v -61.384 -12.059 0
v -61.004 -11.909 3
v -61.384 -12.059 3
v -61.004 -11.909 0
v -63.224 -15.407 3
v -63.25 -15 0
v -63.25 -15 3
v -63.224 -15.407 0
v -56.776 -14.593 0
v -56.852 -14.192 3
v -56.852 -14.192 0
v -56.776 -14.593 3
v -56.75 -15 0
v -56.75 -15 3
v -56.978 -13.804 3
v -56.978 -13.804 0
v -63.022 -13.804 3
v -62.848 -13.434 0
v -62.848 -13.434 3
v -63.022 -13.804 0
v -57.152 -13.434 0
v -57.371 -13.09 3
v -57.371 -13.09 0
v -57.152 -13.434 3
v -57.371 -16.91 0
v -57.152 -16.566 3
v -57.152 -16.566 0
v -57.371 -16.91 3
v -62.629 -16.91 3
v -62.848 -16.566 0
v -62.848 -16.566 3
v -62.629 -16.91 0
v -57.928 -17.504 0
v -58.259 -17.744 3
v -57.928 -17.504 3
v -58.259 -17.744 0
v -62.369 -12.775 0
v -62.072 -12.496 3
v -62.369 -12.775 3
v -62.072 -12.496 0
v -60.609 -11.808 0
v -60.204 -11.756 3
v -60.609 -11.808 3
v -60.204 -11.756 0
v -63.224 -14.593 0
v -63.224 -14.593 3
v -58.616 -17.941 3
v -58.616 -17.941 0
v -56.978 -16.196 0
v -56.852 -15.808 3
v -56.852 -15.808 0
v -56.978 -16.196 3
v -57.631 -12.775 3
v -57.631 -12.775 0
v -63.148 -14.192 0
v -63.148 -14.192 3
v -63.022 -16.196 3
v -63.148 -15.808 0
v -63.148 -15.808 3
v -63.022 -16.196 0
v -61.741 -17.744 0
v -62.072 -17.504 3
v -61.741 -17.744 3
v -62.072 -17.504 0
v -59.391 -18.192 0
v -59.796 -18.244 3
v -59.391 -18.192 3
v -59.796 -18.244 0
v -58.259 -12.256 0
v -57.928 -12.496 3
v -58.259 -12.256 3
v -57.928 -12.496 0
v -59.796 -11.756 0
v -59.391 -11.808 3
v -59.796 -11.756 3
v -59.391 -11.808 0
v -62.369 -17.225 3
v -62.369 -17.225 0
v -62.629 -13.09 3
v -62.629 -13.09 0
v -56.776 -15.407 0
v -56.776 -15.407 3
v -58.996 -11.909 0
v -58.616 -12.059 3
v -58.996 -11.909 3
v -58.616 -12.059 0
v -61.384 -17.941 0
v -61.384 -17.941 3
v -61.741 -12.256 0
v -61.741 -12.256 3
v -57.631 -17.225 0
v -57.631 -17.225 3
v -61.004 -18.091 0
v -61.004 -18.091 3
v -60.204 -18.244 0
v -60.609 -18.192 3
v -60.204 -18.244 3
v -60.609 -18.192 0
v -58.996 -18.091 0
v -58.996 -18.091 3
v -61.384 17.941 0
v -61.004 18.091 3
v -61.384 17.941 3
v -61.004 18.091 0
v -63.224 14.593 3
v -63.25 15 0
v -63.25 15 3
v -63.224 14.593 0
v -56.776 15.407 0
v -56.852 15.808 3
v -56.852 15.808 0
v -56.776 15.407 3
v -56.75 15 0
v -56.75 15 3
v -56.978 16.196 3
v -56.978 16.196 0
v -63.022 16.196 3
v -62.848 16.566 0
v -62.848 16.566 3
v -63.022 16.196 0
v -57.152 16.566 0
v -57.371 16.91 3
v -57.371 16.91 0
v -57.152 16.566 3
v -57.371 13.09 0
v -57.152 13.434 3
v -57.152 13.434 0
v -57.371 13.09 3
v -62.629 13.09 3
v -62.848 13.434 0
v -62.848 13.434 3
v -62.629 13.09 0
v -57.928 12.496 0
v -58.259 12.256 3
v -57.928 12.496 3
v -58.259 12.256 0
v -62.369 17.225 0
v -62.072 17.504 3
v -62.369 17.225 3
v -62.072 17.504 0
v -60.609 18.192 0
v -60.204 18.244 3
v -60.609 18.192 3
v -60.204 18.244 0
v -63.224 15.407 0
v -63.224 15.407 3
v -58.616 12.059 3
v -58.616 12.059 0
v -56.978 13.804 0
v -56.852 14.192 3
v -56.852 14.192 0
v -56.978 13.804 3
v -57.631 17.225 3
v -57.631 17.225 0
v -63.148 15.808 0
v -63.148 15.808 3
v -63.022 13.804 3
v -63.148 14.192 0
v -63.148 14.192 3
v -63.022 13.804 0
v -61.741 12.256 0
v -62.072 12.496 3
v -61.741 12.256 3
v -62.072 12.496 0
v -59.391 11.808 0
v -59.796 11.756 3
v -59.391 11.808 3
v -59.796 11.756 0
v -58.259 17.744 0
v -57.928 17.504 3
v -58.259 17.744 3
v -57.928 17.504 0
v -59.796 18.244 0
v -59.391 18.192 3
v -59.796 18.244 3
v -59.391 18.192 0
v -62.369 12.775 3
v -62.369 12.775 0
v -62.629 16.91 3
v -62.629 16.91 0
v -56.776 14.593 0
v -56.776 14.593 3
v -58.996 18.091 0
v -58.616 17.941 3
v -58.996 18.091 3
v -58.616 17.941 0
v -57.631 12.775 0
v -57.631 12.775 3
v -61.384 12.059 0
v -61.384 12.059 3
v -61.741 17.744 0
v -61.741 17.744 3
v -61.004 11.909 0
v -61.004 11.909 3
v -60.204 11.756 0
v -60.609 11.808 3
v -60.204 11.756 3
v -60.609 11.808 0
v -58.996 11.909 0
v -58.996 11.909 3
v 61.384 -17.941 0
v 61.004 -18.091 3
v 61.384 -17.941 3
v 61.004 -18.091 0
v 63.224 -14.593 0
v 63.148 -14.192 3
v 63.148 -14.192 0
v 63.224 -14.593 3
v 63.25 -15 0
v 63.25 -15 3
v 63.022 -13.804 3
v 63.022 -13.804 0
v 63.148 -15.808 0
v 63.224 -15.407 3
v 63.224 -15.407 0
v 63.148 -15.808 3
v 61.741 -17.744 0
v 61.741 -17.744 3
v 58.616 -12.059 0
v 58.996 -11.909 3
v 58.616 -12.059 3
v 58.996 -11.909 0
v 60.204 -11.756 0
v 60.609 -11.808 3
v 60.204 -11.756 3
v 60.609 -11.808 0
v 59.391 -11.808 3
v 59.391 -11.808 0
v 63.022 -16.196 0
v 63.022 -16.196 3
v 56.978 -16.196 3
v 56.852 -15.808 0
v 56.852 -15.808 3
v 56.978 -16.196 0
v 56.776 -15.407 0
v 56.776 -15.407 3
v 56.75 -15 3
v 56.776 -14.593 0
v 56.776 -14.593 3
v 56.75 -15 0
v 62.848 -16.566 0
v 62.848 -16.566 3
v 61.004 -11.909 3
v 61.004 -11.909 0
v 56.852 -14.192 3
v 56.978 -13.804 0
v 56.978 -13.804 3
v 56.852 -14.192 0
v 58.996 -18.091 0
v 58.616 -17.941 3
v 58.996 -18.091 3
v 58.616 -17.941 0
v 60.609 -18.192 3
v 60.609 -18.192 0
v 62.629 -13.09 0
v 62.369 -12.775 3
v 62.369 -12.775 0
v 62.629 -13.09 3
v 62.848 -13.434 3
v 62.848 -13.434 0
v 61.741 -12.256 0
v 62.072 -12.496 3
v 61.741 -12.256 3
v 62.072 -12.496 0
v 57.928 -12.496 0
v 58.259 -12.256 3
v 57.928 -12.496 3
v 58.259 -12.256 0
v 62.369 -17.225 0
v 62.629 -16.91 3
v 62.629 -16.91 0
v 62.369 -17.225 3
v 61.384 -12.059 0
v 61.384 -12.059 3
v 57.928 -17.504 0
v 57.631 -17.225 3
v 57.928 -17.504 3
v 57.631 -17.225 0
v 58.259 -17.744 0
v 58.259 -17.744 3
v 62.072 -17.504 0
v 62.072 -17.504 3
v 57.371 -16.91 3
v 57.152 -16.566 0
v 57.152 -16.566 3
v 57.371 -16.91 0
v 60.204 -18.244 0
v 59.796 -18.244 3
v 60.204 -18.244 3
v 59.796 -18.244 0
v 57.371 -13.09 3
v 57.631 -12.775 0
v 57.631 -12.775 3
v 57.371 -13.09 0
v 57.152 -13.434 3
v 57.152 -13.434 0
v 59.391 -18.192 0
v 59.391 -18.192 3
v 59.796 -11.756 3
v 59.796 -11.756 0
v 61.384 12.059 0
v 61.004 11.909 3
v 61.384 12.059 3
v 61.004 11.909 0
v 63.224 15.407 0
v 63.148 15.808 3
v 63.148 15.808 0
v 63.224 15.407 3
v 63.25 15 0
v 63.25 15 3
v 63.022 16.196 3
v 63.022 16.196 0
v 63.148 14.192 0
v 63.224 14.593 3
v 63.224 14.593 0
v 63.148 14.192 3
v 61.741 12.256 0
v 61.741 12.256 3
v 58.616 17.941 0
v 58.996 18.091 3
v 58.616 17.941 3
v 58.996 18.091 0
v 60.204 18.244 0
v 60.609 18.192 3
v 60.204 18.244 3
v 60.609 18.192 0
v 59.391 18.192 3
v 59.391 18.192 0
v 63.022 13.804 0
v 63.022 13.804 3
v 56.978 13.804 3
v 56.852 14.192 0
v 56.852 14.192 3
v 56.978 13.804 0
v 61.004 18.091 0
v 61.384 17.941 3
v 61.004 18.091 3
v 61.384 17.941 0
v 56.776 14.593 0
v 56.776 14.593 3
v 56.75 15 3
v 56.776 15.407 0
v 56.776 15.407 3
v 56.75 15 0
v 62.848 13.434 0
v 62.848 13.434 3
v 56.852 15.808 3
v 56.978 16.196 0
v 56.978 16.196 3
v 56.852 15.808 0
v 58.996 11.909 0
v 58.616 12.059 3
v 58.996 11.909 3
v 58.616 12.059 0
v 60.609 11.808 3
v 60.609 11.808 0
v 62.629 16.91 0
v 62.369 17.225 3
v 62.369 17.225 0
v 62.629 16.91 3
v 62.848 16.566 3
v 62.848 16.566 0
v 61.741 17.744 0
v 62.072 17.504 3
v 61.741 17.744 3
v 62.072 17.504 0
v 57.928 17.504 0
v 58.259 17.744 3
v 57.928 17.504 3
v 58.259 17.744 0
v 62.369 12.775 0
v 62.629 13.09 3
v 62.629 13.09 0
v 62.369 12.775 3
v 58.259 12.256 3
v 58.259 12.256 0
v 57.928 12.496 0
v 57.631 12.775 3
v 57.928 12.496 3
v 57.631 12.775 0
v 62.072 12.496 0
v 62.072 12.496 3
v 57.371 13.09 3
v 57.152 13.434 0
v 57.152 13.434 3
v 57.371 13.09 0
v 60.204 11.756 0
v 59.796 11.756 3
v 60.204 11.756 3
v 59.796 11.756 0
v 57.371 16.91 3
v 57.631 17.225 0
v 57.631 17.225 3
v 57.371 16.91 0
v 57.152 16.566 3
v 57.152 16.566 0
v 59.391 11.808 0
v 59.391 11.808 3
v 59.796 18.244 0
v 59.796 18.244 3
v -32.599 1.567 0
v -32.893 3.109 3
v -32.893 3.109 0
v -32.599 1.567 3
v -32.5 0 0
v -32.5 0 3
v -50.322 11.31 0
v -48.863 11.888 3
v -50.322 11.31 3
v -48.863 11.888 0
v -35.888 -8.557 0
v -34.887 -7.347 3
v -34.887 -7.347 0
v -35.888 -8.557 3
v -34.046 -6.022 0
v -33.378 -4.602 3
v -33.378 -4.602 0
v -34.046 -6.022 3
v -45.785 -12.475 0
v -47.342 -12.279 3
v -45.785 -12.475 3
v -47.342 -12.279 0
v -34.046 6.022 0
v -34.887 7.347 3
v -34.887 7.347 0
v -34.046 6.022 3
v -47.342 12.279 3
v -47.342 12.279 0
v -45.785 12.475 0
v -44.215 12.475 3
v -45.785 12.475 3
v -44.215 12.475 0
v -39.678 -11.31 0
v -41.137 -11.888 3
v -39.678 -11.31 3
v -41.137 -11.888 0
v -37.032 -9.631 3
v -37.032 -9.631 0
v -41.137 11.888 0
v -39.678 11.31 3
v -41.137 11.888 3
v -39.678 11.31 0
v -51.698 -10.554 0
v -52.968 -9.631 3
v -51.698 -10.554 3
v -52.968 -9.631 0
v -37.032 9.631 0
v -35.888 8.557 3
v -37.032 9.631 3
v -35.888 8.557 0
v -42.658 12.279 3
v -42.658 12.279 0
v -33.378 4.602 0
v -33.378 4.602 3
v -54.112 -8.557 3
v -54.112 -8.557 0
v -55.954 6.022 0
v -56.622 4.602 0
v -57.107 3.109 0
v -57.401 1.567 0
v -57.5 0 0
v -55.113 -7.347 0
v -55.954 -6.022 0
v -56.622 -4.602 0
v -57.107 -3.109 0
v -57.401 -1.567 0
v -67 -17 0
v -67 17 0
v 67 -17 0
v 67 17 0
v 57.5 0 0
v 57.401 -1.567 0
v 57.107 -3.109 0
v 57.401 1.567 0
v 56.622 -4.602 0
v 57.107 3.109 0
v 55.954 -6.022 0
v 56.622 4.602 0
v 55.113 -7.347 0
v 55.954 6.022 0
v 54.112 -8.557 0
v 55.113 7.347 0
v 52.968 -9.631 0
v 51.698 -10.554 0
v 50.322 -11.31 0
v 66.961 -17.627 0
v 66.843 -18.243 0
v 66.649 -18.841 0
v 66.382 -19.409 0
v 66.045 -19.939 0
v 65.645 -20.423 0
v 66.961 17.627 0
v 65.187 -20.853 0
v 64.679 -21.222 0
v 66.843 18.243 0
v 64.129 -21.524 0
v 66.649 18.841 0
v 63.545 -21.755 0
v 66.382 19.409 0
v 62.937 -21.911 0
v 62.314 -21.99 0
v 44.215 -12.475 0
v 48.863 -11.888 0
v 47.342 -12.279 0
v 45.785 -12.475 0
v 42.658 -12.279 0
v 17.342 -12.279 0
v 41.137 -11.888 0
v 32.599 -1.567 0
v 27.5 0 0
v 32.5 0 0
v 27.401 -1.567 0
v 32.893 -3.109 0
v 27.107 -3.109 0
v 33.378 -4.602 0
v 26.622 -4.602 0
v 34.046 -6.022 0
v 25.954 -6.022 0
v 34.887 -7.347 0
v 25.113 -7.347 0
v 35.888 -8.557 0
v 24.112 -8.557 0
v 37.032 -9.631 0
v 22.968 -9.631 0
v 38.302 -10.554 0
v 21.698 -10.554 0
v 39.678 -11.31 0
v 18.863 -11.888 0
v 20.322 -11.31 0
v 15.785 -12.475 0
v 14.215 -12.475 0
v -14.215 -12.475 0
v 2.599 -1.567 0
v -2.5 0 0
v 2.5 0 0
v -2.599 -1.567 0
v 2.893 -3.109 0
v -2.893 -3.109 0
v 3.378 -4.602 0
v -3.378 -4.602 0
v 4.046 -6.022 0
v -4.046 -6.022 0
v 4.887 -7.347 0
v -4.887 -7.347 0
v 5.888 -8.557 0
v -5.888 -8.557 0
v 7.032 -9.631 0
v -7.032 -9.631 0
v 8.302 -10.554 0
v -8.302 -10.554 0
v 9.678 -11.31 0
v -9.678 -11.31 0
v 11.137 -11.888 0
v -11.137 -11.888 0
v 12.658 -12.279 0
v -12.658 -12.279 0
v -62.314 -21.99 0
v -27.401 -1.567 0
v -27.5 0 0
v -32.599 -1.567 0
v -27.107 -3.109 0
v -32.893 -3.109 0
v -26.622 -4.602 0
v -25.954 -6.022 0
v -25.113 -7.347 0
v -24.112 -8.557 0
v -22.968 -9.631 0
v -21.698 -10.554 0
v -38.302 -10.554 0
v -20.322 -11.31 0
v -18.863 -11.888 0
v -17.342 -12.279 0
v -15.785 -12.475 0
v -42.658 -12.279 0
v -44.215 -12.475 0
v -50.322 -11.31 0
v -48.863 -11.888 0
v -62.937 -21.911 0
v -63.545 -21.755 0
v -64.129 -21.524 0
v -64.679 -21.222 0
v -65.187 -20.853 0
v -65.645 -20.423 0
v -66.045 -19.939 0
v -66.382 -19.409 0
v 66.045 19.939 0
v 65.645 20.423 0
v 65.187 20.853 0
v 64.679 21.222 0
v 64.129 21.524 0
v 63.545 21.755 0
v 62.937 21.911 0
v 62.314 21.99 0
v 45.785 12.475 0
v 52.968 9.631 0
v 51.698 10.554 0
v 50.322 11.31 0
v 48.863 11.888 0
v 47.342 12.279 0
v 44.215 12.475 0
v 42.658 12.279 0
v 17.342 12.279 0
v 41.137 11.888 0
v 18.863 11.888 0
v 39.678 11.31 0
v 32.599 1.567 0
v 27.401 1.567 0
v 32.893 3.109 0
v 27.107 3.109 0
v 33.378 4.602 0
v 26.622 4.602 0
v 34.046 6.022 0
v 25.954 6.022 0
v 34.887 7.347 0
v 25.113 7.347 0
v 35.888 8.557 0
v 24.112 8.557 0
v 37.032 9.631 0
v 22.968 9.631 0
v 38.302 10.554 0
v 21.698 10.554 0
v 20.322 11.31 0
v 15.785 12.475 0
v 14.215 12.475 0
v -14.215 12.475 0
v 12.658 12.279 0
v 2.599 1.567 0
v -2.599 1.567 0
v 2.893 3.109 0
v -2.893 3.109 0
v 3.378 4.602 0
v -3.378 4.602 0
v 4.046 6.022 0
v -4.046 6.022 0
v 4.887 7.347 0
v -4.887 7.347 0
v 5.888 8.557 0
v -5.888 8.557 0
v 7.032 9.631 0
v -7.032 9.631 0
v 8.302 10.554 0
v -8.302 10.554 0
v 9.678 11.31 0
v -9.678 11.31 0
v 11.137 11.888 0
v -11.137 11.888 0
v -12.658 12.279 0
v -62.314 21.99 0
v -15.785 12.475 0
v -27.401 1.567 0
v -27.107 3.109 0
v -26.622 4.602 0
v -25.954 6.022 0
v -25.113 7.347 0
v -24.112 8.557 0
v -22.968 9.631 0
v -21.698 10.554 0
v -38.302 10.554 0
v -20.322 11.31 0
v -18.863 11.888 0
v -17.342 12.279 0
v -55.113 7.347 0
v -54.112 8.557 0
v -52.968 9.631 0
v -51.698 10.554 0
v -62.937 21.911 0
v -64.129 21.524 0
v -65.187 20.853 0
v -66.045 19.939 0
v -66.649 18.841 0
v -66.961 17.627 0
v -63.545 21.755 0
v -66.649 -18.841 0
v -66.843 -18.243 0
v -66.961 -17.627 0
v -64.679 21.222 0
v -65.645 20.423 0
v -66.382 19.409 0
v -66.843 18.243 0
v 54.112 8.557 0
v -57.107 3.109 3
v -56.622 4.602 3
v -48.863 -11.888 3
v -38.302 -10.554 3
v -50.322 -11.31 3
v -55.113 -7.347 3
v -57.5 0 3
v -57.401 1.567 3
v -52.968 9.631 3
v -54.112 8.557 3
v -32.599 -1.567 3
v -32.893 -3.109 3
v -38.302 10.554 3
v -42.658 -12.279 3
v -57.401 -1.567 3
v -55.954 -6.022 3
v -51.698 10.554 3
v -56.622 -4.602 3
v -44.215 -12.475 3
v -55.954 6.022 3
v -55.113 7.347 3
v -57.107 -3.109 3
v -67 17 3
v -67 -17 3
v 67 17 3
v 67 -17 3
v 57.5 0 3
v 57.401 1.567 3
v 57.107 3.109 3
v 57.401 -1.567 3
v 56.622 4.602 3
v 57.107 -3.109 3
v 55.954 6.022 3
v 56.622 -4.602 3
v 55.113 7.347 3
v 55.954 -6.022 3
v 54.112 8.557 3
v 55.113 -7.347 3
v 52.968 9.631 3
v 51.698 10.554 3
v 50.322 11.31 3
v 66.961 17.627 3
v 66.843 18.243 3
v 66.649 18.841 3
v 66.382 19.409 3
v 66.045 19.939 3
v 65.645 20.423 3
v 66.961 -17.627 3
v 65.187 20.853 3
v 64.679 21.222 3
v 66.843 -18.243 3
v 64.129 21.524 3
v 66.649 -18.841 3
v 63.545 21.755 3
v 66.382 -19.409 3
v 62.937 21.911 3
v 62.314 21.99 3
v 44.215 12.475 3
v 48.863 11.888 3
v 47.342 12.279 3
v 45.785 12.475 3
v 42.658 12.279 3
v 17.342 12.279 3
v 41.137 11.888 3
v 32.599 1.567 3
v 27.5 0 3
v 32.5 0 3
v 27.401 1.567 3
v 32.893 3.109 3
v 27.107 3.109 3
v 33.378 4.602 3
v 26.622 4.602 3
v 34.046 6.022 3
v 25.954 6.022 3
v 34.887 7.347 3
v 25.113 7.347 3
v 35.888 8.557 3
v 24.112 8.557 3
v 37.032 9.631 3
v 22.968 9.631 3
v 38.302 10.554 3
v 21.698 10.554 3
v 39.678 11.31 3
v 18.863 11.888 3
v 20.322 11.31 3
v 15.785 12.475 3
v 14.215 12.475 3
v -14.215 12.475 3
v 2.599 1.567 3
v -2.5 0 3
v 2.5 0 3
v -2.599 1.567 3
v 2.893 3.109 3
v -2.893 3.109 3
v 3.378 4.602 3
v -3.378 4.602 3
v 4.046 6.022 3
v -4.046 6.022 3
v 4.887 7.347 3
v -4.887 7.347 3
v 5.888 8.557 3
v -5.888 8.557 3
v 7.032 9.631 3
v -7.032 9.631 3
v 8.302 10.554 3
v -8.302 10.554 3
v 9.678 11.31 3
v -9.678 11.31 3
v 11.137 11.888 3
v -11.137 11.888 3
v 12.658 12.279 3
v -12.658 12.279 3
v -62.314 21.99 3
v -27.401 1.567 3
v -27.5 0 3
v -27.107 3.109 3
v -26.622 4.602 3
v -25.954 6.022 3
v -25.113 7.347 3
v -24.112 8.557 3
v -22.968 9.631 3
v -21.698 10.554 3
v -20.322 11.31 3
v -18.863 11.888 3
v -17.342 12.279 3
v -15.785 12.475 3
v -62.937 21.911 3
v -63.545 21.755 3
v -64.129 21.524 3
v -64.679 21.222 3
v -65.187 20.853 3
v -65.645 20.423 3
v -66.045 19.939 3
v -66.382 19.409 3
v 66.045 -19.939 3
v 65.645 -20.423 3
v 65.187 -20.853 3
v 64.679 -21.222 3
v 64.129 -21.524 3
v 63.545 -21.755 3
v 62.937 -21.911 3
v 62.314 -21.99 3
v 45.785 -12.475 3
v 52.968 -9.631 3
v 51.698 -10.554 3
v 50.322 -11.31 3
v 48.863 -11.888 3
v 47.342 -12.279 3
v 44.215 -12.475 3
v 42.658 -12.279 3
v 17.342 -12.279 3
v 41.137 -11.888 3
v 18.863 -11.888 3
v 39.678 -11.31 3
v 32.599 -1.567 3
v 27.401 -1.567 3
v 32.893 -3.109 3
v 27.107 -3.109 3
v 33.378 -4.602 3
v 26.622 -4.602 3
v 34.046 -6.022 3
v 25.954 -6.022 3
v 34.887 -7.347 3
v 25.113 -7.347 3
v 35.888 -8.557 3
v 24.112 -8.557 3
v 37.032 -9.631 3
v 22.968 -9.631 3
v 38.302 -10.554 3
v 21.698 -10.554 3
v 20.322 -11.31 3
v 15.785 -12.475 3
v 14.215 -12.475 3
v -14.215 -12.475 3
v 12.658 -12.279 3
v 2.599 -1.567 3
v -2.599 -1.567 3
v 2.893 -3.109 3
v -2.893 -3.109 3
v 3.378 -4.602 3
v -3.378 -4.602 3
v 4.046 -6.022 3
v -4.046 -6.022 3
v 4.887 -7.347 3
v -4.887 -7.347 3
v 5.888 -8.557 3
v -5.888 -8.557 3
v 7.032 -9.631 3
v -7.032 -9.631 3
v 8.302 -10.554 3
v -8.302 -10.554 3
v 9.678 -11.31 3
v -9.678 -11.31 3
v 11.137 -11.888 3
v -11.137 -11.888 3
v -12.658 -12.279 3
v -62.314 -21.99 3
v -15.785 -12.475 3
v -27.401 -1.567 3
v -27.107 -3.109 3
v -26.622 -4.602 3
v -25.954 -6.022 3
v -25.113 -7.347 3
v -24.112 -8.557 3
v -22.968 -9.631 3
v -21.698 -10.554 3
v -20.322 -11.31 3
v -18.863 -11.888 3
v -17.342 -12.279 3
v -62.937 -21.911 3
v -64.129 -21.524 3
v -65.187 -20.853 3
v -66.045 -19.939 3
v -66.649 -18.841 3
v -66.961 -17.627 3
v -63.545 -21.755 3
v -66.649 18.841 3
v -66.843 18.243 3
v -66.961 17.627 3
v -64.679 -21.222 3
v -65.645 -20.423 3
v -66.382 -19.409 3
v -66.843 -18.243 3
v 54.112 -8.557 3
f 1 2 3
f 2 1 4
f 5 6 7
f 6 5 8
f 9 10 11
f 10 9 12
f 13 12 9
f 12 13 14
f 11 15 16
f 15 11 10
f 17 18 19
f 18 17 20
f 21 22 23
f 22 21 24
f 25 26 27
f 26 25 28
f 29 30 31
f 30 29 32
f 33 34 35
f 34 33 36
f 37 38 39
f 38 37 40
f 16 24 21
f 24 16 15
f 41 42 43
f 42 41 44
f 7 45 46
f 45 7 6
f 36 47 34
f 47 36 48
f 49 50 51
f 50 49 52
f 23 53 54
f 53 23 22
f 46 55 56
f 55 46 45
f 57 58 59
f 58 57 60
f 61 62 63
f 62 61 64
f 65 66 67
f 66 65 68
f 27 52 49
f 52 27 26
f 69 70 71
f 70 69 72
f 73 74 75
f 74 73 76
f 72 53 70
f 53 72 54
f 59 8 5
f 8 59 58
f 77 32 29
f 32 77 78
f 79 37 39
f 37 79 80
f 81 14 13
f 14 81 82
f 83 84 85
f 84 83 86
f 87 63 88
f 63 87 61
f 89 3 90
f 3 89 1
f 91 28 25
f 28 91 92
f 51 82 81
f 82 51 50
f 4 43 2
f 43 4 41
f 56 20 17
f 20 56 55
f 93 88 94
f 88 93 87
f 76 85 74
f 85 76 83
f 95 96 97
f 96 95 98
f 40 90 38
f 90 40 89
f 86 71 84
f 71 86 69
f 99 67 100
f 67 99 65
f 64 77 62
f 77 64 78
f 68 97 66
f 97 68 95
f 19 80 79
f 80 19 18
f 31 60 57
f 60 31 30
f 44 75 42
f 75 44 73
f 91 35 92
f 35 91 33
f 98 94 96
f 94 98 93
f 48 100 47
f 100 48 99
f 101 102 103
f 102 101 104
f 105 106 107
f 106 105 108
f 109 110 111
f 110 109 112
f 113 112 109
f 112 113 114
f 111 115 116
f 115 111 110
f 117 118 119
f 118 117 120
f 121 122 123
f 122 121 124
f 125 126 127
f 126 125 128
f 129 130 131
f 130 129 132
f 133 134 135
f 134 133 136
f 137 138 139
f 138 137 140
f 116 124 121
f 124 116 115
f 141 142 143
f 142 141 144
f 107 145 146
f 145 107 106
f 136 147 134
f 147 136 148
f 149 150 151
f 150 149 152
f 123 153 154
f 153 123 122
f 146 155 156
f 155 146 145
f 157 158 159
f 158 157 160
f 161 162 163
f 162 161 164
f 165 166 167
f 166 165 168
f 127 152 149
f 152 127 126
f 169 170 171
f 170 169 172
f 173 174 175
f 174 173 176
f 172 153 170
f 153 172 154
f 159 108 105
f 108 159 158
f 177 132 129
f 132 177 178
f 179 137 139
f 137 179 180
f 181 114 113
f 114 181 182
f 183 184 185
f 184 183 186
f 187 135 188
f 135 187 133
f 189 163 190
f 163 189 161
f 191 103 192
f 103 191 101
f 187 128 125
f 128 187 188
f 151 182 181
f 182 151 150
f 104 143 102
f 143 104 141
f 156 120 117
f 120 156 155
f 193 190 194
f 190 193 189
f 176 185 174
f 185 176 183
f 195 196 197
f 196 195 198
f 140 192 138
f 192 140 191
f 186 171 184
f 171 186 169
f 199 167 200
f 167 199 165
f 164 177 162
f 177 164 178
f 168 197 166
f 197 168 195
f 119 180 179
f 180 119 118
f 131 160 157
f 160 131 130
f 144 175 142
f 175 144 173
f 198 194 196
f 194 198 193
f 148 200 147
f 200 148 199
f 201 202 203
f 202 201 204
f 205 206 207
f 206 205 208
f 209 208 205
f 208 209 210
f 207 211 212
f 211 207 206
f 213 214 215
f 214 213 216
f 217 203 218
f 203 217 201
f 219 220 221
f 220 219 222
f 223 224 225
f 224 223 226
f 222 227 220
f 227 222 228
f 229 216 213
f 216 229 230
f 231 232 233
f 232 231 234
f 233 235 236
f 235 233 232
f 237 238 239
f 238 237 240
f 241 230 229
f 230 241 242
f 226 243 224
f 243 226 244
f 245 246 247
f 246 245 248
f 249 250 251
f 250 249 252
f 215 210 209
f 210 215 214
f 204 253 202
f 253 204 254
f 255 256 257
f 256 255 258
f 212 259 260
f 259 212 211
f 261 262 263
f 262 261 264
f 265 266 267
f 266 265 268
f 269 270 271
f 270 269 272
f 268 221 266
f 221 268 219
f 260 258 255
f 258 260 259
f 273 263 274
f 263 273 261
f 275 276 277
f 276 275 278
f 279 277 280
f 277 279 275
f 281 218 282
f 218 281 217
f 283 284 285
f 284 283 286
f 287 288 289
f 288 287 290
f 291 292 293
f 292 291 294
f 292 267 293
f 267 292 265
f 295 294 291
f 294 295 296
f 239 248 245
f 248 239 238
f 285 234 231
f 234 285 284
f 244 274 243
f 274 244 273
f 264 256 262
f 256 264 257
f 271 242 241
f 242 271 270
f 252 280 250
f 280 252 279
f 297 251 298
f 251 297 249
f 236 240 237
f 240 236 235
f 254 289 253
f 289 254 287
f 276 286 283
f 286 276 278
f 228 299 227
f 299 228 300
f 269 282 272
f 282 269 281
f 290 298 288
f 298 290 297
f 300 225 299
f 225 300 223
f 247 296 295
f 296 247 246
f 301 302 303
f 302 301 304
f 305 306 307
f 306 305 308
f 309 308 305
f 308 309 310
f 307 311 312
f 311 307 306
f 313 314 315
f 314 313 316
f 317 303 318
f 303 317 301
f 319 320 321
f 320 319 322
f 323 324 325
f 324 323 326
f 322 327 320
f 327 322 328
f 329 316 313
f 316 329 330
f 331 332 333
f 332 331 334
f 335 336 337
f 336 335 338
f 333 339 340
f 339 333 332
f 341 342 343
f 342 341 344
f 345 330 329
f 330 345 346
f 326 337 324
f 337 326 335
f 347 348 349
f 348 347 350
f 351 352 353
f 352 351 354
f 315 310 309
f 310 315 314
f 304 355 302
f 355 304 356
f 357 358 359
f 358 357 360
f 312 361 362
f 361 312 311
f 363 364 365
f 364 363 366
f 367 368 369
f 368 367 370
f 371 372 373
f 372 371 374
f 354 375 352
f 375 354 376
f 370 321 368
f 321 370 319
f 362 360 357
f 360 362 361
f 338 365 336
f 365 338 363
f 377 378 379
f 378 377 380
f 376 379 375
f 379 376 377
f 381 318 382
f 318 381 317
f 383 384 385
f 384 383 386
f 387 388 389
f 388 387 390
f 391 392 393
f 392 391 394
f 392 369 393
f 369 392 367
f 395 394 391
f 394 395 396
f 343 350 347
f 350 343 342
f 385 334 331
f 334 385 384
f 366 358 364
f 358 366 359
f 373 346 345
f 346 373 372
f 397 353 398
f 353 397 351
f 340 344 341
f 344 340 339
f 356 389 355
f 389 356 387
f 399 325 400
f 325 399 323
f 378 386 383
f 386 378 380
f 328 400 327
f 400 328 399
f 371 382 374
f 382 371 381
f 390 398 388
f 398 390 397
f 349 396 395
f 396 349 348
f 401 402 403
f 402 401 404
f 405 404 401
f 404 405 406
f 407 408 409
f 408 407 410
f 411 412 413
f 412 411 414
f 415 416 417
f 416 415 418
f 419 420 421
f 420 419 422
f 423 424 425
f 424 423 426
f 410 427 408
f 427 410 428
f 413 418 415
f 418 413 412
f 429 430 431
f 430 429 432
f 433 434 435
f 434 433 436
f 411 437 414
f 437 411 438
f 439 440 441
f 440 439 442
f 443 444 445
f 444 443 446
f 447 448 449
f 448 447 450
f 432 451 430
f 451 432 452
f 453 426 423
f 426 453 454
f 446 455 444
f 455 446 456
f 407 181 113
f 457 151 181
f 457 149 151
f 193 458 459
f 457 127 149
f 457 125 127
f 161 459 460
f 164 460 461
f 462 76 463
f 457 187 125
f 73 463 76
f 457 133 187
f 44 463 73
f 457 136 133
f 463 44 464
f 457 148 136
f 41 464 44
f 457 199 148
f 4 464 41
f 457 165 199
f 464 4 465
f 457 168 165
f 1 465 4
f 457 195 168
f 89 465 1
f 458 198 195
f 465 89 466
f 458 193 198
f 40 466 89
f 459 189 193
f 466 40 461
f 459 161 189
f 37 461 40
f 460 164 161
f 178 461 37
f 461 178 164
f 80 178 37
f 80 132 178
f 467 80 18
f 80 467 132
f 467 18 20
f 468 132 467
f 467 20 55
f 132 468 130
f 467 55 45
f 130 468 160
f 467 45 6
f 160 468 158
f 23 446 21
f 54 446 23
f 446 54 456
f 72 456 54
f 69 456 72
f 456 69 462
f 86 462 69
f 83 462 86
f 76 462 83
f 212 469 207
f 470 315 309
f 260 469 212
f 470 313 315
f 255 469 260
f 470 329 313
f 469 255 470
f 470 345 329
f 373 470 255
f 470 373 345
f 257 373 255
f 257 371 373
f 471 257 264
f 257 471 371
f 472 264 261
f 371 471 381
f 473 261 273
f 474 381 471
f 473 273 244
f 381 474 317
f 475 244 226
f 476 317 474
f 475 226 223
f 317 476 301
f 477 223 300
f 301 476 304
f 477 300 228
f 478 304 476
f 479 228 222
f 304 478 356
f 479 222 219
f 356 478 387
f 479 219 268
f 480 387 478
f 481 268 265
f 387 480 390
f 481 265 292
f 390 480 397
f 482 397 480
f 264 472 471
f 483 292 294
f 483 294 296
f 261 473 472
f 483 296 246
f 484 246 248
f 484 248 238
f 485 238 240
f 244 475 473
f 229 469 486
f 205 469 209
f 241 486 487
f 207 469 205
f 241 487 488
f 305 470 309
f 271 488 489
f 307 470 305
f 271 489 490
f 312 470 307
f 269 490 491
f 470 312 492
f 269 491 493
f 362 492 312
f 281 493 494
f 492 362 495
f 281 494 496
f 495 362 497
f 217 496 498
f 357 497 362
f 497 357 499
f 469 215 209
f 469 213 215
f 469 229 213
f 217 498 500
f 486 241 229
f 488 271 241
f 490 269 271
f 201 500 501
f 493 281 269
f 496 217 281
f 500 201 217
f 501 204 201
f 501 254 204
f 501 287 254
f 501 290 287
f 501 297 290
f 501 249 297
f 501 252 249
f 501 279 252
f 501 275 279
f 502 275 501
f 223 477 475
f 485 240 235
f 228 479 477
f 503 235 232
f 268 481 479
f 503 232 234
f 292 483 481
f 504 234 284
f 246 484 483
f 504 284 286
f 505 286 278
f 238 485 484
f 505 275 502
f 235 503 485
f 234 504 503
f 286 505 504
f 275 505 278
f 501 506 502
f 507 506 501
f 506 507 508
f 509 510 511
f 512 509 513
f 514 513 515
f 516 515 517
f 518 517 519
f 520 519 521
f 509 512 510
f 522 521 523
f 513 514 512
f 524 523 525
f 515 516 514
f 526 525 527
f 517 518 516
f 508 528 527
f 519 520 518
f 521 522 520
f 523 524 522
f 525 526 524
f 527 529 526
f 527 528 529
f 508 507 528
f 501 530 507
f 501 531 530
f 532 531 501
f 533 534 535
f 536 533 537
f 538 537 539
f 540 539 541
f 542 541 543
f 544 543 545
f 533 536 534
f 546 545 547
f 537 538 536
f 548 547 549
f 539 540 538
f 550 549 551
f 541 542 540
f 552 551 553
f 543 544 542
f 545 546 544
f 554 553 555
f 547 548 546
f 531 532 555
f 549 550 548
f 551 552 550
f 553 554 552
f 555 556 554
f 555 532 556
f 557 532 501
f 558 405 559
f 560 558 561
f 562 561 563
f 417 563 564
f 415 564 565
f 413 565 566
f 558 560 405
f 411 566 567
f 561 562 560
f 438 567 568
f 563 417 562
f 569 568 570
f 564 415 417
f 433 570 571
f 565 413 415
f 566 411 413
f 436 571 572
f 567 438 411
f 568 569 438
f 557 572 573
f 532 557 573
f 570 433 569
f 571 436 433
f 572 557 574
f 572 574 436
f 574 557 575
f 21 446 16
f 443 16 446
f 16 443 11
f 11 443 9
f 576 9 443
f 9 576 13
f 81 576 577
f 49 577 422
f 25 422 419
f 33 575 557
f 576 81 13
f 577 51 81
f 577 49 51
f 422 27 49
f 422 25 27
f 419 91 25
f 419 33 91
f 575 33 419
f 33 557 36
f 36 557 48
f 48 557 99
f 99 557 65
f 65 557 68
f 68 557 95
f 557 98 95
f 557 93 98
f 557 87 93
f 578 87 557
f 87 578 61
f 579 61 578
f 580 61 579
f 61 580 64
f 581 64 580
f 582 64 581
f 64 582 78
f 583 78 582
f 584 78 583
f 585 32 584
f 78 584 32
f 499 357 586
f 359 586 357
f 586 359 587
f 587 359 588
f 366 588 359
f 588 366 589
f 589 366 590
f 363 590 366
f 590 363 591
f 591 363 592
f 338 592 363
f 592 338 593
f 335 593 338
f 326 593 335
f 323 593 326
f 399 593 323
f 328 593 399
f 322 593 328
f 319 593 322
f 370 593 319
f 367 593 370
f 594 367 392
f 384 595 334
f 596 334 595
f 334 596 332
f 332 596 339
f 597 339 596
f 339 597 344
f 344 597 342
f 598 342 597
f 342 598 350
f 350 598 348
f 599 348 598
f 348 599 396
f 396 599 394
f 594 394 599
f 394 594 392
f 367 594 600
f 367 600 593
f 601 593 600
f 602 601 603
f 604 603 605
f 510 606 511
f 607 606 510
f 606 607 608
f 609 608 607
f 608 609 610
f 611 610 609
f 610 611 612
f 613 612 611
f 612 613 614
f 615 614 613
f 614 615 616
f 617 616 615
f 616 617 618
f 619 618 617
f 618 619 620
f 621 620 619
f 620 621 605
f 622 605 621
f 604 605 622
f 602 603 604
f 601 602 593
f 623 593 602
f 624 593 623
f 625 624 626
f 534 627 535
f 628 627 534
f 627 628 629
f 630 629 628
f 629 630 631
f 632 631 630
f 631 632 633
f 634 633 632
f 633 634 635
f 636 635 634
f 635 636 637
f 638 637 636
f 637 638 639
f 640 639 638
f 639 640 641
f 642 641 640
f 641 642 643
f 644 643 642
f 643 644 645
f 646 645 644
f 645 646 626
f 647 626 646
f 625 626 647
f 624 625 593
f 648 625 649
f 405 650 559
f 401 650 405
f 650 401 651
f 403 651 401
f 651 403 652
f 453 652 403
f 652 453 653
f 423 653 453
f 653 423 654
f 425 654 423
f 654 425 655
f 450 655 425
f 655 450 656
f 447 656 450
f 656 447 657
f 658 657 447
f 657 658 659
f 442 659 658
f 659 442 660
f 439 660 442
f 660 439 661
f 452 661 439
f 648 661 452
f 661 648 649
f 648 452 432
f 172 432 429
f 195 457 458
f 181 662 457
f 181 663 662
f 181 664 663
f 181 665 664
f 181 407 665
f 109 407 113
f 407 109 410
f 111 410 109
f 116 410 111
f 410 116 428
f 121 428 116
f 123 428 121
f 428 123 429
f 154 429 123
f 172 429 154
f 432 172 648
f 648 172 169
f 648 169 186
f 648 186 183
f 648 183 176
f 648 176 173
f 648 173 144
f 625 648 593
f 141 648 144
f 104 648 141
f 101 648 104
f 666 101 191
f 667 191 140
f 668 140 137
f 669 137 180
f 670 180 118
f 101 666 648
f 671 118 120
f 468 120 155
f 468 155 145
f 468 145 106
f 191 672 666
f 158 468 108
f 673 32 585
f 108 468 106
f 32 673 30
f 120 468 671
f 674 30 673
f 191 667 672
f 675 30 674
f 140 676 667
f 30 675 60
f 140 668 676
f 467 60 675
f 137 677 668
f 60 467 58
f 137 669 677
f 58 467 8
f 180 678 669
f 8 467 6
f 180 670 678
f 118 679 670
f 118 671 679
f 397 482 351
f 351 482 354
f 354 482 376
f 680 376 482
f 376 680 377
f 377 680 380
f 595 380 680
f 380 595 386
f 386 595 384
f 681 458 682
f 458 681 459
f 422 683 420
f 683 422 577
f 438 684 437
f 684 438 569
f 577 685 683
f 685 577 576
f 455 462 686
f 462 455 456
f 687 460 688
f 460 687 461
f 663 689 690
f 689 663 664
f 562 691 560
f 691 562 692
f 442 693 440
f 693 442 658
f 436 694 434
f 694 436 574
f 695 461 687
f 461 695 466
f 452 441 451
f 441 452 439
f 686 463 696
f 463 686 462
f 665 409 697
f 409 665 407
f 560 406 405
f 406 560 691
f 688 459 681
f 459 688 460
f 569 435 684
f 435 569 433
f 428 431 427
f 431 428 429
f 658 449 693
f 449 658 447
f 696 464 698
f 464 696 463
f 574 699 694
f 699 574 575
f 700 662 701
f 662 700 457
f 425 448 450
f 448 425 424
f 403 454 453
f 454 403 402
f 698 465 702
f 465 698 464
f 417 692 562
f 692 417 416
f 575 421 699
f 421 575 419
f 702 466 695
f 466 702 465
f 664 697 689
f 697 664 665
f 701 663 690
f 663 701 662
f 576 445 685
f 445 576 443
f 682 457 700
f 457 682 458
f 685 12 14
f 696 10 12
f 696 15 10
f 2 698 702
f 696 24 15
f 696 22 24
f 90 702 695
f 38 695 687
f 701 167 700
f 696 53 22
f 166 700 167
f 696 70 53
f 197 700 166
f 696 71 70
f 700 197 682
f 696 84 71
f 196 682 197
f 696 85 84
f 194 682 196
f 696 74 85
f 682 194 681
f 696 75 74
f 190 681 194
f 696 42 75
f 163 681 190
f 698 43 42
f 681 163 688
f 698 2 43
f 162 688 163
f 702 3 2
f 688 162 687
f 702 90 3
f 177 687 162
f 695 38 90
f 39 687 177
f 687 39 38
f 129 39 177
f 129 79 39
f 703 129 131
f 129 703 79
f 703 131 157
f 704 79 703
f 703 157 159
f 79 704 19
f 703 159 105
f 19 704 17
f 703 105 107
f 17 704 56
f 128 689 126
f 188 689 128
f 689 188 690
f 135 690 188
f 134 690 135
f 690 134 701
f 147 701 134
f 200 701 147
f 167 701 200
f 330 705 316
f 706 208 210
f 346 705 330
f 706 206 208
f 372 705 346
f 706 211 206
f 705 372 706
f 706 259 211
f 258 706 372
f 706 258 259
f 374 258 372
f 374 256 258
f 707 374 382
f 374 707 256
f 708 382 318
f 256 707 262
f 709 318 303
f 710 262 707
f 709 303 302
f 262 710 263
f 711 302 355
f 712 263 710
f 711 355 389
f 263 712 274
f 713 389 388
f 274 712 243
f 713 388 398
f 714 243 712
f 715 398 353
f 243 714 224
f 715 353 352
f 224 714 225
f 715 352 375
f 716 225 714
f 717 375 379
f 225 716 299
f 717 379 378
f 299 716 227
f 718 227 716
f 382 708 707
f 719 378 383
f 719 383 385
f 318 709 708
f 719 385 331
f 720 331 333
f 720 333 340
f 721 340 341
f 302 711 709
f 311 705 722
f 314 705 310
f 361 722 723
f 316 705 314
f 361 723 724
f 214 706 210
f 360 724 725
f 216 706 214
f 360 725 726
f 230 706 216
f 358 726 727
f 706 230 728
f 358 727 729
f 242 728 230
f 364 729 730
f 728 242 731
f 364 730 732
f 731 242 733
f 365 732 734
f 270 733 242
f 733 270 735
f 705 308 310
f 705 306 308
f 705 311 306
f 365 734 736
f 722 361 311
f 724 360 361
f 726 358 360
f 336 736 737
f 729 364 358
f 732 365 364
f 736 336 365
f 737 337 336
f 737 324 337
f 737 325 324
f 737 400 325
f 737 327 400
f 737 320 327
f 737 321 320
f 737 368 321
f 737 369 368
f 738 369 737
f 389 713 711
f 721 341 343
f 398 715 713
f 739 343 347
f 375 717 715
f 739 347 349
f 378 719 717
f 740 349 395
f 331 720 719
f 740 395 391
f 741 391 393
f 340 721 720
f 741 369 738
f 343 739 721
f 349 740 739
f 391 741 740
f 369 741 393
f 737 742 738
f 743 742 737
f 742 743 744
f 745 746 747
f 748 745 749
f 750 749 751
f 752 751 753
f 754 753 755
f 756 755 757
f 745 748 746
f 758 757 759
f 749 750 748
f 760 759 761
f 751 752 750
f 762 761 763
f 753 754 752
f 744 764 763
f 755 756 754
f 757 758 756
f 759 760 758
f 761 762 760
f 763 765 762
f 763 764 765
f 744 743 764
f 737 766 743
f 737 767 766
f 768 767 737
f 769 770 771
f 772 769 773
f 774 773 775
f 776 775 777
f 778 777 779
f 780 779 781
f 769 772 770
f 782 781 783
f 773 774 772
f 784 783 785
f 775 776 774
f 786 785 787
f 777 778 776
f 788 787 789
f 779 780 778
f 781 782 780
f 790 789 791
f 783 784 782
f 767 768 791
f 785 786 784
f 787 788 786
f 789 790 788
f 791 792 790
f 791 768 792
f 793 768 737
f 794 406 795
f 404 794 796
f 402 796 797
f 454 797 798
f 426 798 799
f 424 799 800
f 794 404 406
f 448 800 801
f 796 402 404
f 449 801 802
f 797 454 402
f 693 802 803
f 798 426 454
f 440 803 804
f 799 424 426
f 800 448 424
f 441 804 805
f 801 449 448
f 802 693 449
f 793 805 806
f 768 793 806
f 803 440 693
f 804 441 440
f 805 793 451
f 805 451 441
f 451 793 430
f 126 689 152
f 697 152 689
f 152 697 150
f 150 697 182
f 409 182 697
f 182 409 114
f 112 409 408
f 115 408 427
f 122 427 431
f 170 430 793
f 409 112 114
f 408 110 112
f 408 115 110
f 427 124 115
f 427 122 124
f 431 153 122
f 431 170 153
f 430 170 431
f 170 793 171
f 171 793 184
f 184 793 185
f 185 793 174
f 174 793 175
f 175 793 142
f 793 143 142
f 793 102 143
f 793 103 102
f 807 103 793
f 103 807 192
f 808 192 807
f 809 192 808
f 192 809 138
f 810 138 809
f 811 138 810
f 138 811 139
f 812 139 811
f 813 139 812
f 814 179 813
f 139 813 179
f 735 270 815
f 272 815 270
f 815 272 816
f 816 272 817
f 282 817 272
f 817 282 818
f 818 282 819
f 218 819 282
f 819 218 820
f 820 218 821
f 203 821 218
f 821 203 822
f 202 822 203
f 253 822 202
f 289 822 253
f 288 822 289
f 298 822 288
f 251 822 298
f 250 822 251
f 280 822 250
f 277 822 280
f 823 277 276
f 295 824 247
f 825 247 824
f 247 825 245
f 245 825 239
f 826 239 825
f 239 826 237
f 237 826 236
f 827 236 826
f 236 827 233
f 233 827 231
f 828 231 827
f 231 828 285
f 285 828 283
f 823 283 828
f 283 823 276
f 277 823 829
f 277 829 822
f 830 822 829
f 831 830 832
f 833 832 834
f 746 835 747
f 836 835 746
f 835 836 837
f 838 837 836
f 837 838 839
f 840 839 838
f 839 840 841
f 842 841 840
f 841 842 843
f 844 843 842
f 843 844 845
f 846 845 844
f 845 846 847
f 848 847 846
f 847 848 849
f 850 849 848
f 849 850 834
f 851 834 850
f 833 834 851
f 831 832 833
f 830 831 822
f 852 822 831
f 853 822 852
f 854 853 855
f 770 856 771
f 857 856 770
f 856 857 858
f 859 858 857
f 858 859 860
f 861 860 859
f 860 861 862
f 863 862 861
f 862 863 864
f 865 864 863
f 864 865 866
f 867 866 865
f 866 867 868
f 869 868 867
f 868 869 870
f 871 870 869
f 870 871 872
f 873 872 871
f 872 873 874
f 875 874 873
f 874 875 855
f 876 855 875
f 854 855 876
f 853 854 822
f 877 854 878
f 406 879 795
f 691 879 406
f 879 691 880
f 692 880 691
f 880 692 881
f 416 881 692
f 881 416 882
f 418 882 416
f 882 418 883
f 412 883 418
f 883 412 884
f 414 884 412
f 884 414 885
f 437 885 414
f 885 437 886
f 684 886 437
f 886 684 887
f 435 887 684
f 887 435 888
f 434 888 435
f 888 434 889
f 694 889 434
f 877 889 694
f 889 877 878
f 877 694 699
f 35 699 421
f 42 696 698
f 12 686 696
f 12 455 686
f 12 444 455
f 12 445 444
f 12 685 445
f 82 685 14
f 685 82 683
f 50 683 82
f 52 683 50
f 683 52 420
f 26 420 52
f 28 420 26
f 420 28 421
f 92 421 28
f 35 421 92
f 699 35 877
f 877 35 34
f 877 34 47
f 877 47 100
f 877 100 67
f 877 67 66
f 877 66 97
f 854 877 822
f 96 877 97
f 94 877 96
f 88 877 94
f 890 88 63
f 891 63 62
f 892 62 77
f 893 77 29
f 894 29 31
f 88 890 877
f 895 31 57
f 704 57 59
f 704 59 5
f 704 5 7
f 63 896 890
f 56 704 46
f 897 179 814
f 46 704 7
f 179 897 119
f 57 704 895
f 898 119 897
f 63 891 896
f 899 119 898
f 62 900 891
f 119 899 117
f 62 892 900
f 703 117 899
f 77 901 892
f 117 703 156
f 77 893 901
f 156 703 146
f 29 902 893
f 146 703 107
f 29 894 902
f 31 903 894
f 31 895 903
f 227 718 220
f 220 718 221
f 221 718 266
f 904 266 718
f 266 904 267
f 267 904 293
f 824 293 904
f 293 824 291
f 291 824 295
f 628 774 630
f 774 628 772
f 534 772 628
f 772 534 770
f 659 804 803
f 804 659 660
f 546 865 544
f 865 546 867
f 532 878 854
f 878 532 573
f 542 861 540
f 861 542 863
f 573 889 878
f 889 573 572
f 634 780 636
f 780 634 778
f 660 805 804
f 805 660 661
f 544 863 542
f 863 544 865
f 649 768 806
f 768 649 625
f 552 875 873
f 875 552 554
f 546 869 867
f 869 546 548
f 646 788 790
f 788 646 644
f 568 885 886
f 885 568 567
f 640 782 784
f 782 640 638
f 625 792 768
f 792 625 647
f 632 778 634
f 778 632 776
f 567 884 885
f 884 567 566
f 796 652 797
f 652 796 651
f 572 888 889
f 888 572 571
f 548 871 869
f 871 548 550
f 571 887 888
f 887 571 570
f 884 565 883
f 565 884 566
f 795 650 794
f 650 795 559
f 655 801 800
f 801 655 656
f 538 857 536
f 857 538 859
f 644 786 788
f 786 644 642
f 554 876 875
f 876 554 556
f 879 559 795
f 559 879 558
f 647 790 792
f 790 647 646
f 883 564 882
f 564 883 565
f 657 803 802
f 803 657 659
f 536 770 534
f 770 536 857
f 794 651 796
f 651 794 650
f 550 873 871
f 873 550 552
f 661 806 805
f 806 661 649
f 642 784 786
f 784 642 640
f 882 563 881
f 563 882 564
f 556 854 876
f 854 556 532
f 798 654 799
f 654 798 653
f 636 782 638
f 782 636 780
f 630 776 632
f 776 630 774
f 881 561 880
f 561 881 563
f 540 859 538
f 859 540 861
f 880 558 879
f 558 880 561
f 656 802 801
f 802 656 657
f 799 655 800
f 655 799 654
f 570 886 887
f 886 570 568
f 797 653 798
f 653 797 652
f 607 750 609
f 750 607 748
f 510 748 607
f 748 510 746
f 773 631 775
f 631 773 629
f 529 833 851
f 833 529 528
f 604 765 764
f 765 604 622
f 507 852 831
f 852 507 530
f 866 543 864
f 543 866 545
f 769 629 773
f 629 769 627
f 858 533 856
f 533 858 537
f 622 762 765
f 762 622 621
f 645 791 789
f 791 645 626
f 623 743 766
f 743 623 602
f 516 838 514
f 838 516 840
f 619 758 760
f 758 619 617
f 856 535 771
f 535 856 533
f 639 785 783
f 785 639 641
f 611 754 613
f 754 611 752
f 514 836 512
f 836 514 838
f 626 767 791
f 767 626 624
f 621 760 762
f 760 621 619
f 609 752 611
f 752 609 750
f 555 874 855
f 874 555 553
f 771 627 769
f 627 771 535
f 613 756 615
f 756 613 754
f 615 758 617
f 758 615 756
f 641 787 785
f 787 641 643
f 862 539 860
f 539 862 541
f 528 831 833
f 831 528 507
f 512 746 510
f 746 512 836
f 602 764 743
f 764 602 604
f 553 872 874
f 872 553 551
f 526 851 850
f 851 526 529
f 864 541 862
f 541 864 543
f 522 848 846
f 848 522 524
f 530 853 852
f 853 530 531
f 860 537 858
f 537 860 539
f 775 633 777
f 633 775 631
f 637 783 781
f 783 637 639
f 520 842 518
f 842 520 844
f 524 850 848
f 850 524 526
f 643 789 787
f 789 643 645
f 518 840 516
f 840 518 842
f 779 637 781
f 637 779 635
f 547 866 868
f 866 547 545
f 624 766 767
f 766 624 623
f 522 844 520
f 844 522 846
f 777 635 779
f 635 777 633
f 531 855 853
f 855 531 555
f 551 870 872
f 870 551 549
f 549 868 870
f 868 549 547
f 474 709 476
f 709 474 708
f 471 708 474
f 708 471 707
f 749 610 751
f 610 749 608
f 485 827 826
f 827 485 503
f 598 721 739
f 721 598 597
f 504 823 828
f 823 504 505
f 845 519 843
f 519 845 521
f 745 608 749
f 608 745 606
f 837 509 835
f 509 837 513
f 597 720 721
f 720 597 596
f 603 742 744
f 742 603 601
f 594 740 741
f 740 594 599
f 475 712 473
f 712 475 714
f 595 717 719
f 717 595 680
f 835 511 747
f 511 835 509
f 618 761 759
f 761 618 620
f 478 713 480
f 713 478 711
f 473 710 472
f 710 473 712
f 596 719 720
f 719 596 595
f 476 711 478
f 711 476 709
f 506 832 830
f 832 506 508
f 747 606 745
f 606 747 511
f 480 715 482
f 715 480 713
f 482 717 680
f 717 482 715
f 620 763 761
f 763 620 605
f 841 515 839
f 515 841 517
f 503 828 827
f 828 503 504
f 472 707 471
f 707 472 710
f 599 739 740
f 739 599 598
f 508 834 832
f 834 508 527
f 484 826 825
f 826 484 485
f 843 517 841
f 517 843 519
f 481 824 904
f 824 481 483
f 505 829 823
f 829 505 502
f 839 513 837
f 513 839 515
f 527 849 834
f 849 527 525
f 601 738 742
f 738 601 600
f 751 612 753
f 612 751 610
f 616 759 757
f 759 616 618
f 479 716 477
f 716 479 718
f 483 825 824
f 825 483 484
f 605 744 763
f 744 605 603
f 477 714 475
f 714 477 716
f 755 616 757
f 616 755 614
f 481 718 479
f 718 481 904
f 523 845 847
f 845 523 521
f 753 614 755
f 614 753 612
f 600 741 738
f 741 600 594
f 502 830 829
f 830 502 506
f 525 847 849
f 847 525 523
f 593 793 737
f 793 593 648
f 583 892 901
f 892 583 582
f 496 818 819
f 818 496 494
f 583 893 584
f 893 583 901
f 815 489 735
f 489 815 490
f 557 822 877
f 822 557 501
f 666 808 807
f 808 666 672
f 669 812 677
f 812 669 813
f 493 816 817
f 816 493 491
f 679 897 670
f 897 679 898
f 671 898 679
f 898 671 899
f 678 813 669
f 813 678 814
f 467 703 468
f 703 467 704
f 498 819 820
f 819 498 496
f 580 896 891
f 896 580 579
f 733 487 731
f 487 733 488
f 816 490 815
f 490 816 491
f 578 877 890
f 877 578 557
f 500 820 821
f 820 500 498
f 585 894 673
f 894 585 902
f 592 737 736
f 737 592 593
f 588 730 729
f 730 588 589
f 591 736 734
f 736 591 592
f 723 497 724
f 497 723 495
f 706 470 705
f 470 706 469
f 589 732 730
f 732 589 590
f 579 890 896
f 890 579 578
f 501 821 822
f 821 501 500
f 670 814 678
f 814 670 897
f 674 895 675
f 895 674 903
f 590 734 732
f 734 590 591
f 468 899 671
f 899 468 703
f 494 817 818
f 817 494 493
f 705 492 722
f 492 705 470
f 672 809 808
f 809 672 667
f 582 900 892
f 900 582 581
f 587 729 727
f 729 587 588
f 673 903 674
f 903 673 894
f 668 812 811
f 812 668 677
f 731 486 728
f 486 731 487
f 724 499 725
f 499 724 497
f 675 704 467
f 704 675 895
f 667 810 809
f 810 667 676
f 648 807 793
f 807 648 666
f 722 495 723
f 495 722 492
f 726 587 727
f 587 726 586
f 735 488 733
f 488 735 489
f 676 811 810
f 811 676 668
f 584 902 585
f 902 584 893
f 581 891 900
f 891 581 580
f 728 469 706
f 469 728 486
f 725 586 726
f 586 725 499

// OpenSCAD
$fn = 50;


difference() {
	union() {
		hull() {
			translate(v = [-62.0000000000, 17.0000000000, 0]) {
				cylinder(h = 3, r = 5);
			}
			translate(v = [62.0000000000, 17.0000000000, 0]) {
				cylinder(h = 3, r = 5);
			}
			translate(v = [-62.0000000000, -17.0000000000, 0]) {
				cylinder(h = 3, r = 5);
			}
			translate(v = [62.0000000000, -17.0000000000, 0]) {
				cylinder(h = 3, r = 5);
			}
		}
	}
	union() {
		#translate(v = [-60.0000000000, -15.0000000000, -100.0000000000]) {
			cylinder(h = 200, r = 3.2500000000);
		}
		#translate(v = [-60.0000000000, 15.0000000000, -100.0000000000]) {
			cylinder(h = 200, r = 3.2500000000);
		}
		#translate(v = [60.0000000000, -15.0000000000, -100.0000000000]) {
			cylinder(h = 200, r = 3.2500000000);
		}
		#translate(v = [60.0000000000, 15.0000000000, -100.0000000000]) {
			cylinder(h = 200, r = 3.2500000000);
		}
		#translate(v = [-45.0000000000, 0, 0]) {
			cylinder(h = 3, r = 12.5000000000);
		}
		#translate(v = [-15.0000000000, 0, 0]) {
			cylinder(h = 3, r = 12.5000000000);
		}
		#translate(v = [15.0000000000, 0, 0]) {
			cylinder(h = 3, r = 12.5000000000);
		}
		#translate(v = [45.0000000000, 0, 0]) {
			cylinder(h = 3, r = 12.5000000000);
		}
	}
}
